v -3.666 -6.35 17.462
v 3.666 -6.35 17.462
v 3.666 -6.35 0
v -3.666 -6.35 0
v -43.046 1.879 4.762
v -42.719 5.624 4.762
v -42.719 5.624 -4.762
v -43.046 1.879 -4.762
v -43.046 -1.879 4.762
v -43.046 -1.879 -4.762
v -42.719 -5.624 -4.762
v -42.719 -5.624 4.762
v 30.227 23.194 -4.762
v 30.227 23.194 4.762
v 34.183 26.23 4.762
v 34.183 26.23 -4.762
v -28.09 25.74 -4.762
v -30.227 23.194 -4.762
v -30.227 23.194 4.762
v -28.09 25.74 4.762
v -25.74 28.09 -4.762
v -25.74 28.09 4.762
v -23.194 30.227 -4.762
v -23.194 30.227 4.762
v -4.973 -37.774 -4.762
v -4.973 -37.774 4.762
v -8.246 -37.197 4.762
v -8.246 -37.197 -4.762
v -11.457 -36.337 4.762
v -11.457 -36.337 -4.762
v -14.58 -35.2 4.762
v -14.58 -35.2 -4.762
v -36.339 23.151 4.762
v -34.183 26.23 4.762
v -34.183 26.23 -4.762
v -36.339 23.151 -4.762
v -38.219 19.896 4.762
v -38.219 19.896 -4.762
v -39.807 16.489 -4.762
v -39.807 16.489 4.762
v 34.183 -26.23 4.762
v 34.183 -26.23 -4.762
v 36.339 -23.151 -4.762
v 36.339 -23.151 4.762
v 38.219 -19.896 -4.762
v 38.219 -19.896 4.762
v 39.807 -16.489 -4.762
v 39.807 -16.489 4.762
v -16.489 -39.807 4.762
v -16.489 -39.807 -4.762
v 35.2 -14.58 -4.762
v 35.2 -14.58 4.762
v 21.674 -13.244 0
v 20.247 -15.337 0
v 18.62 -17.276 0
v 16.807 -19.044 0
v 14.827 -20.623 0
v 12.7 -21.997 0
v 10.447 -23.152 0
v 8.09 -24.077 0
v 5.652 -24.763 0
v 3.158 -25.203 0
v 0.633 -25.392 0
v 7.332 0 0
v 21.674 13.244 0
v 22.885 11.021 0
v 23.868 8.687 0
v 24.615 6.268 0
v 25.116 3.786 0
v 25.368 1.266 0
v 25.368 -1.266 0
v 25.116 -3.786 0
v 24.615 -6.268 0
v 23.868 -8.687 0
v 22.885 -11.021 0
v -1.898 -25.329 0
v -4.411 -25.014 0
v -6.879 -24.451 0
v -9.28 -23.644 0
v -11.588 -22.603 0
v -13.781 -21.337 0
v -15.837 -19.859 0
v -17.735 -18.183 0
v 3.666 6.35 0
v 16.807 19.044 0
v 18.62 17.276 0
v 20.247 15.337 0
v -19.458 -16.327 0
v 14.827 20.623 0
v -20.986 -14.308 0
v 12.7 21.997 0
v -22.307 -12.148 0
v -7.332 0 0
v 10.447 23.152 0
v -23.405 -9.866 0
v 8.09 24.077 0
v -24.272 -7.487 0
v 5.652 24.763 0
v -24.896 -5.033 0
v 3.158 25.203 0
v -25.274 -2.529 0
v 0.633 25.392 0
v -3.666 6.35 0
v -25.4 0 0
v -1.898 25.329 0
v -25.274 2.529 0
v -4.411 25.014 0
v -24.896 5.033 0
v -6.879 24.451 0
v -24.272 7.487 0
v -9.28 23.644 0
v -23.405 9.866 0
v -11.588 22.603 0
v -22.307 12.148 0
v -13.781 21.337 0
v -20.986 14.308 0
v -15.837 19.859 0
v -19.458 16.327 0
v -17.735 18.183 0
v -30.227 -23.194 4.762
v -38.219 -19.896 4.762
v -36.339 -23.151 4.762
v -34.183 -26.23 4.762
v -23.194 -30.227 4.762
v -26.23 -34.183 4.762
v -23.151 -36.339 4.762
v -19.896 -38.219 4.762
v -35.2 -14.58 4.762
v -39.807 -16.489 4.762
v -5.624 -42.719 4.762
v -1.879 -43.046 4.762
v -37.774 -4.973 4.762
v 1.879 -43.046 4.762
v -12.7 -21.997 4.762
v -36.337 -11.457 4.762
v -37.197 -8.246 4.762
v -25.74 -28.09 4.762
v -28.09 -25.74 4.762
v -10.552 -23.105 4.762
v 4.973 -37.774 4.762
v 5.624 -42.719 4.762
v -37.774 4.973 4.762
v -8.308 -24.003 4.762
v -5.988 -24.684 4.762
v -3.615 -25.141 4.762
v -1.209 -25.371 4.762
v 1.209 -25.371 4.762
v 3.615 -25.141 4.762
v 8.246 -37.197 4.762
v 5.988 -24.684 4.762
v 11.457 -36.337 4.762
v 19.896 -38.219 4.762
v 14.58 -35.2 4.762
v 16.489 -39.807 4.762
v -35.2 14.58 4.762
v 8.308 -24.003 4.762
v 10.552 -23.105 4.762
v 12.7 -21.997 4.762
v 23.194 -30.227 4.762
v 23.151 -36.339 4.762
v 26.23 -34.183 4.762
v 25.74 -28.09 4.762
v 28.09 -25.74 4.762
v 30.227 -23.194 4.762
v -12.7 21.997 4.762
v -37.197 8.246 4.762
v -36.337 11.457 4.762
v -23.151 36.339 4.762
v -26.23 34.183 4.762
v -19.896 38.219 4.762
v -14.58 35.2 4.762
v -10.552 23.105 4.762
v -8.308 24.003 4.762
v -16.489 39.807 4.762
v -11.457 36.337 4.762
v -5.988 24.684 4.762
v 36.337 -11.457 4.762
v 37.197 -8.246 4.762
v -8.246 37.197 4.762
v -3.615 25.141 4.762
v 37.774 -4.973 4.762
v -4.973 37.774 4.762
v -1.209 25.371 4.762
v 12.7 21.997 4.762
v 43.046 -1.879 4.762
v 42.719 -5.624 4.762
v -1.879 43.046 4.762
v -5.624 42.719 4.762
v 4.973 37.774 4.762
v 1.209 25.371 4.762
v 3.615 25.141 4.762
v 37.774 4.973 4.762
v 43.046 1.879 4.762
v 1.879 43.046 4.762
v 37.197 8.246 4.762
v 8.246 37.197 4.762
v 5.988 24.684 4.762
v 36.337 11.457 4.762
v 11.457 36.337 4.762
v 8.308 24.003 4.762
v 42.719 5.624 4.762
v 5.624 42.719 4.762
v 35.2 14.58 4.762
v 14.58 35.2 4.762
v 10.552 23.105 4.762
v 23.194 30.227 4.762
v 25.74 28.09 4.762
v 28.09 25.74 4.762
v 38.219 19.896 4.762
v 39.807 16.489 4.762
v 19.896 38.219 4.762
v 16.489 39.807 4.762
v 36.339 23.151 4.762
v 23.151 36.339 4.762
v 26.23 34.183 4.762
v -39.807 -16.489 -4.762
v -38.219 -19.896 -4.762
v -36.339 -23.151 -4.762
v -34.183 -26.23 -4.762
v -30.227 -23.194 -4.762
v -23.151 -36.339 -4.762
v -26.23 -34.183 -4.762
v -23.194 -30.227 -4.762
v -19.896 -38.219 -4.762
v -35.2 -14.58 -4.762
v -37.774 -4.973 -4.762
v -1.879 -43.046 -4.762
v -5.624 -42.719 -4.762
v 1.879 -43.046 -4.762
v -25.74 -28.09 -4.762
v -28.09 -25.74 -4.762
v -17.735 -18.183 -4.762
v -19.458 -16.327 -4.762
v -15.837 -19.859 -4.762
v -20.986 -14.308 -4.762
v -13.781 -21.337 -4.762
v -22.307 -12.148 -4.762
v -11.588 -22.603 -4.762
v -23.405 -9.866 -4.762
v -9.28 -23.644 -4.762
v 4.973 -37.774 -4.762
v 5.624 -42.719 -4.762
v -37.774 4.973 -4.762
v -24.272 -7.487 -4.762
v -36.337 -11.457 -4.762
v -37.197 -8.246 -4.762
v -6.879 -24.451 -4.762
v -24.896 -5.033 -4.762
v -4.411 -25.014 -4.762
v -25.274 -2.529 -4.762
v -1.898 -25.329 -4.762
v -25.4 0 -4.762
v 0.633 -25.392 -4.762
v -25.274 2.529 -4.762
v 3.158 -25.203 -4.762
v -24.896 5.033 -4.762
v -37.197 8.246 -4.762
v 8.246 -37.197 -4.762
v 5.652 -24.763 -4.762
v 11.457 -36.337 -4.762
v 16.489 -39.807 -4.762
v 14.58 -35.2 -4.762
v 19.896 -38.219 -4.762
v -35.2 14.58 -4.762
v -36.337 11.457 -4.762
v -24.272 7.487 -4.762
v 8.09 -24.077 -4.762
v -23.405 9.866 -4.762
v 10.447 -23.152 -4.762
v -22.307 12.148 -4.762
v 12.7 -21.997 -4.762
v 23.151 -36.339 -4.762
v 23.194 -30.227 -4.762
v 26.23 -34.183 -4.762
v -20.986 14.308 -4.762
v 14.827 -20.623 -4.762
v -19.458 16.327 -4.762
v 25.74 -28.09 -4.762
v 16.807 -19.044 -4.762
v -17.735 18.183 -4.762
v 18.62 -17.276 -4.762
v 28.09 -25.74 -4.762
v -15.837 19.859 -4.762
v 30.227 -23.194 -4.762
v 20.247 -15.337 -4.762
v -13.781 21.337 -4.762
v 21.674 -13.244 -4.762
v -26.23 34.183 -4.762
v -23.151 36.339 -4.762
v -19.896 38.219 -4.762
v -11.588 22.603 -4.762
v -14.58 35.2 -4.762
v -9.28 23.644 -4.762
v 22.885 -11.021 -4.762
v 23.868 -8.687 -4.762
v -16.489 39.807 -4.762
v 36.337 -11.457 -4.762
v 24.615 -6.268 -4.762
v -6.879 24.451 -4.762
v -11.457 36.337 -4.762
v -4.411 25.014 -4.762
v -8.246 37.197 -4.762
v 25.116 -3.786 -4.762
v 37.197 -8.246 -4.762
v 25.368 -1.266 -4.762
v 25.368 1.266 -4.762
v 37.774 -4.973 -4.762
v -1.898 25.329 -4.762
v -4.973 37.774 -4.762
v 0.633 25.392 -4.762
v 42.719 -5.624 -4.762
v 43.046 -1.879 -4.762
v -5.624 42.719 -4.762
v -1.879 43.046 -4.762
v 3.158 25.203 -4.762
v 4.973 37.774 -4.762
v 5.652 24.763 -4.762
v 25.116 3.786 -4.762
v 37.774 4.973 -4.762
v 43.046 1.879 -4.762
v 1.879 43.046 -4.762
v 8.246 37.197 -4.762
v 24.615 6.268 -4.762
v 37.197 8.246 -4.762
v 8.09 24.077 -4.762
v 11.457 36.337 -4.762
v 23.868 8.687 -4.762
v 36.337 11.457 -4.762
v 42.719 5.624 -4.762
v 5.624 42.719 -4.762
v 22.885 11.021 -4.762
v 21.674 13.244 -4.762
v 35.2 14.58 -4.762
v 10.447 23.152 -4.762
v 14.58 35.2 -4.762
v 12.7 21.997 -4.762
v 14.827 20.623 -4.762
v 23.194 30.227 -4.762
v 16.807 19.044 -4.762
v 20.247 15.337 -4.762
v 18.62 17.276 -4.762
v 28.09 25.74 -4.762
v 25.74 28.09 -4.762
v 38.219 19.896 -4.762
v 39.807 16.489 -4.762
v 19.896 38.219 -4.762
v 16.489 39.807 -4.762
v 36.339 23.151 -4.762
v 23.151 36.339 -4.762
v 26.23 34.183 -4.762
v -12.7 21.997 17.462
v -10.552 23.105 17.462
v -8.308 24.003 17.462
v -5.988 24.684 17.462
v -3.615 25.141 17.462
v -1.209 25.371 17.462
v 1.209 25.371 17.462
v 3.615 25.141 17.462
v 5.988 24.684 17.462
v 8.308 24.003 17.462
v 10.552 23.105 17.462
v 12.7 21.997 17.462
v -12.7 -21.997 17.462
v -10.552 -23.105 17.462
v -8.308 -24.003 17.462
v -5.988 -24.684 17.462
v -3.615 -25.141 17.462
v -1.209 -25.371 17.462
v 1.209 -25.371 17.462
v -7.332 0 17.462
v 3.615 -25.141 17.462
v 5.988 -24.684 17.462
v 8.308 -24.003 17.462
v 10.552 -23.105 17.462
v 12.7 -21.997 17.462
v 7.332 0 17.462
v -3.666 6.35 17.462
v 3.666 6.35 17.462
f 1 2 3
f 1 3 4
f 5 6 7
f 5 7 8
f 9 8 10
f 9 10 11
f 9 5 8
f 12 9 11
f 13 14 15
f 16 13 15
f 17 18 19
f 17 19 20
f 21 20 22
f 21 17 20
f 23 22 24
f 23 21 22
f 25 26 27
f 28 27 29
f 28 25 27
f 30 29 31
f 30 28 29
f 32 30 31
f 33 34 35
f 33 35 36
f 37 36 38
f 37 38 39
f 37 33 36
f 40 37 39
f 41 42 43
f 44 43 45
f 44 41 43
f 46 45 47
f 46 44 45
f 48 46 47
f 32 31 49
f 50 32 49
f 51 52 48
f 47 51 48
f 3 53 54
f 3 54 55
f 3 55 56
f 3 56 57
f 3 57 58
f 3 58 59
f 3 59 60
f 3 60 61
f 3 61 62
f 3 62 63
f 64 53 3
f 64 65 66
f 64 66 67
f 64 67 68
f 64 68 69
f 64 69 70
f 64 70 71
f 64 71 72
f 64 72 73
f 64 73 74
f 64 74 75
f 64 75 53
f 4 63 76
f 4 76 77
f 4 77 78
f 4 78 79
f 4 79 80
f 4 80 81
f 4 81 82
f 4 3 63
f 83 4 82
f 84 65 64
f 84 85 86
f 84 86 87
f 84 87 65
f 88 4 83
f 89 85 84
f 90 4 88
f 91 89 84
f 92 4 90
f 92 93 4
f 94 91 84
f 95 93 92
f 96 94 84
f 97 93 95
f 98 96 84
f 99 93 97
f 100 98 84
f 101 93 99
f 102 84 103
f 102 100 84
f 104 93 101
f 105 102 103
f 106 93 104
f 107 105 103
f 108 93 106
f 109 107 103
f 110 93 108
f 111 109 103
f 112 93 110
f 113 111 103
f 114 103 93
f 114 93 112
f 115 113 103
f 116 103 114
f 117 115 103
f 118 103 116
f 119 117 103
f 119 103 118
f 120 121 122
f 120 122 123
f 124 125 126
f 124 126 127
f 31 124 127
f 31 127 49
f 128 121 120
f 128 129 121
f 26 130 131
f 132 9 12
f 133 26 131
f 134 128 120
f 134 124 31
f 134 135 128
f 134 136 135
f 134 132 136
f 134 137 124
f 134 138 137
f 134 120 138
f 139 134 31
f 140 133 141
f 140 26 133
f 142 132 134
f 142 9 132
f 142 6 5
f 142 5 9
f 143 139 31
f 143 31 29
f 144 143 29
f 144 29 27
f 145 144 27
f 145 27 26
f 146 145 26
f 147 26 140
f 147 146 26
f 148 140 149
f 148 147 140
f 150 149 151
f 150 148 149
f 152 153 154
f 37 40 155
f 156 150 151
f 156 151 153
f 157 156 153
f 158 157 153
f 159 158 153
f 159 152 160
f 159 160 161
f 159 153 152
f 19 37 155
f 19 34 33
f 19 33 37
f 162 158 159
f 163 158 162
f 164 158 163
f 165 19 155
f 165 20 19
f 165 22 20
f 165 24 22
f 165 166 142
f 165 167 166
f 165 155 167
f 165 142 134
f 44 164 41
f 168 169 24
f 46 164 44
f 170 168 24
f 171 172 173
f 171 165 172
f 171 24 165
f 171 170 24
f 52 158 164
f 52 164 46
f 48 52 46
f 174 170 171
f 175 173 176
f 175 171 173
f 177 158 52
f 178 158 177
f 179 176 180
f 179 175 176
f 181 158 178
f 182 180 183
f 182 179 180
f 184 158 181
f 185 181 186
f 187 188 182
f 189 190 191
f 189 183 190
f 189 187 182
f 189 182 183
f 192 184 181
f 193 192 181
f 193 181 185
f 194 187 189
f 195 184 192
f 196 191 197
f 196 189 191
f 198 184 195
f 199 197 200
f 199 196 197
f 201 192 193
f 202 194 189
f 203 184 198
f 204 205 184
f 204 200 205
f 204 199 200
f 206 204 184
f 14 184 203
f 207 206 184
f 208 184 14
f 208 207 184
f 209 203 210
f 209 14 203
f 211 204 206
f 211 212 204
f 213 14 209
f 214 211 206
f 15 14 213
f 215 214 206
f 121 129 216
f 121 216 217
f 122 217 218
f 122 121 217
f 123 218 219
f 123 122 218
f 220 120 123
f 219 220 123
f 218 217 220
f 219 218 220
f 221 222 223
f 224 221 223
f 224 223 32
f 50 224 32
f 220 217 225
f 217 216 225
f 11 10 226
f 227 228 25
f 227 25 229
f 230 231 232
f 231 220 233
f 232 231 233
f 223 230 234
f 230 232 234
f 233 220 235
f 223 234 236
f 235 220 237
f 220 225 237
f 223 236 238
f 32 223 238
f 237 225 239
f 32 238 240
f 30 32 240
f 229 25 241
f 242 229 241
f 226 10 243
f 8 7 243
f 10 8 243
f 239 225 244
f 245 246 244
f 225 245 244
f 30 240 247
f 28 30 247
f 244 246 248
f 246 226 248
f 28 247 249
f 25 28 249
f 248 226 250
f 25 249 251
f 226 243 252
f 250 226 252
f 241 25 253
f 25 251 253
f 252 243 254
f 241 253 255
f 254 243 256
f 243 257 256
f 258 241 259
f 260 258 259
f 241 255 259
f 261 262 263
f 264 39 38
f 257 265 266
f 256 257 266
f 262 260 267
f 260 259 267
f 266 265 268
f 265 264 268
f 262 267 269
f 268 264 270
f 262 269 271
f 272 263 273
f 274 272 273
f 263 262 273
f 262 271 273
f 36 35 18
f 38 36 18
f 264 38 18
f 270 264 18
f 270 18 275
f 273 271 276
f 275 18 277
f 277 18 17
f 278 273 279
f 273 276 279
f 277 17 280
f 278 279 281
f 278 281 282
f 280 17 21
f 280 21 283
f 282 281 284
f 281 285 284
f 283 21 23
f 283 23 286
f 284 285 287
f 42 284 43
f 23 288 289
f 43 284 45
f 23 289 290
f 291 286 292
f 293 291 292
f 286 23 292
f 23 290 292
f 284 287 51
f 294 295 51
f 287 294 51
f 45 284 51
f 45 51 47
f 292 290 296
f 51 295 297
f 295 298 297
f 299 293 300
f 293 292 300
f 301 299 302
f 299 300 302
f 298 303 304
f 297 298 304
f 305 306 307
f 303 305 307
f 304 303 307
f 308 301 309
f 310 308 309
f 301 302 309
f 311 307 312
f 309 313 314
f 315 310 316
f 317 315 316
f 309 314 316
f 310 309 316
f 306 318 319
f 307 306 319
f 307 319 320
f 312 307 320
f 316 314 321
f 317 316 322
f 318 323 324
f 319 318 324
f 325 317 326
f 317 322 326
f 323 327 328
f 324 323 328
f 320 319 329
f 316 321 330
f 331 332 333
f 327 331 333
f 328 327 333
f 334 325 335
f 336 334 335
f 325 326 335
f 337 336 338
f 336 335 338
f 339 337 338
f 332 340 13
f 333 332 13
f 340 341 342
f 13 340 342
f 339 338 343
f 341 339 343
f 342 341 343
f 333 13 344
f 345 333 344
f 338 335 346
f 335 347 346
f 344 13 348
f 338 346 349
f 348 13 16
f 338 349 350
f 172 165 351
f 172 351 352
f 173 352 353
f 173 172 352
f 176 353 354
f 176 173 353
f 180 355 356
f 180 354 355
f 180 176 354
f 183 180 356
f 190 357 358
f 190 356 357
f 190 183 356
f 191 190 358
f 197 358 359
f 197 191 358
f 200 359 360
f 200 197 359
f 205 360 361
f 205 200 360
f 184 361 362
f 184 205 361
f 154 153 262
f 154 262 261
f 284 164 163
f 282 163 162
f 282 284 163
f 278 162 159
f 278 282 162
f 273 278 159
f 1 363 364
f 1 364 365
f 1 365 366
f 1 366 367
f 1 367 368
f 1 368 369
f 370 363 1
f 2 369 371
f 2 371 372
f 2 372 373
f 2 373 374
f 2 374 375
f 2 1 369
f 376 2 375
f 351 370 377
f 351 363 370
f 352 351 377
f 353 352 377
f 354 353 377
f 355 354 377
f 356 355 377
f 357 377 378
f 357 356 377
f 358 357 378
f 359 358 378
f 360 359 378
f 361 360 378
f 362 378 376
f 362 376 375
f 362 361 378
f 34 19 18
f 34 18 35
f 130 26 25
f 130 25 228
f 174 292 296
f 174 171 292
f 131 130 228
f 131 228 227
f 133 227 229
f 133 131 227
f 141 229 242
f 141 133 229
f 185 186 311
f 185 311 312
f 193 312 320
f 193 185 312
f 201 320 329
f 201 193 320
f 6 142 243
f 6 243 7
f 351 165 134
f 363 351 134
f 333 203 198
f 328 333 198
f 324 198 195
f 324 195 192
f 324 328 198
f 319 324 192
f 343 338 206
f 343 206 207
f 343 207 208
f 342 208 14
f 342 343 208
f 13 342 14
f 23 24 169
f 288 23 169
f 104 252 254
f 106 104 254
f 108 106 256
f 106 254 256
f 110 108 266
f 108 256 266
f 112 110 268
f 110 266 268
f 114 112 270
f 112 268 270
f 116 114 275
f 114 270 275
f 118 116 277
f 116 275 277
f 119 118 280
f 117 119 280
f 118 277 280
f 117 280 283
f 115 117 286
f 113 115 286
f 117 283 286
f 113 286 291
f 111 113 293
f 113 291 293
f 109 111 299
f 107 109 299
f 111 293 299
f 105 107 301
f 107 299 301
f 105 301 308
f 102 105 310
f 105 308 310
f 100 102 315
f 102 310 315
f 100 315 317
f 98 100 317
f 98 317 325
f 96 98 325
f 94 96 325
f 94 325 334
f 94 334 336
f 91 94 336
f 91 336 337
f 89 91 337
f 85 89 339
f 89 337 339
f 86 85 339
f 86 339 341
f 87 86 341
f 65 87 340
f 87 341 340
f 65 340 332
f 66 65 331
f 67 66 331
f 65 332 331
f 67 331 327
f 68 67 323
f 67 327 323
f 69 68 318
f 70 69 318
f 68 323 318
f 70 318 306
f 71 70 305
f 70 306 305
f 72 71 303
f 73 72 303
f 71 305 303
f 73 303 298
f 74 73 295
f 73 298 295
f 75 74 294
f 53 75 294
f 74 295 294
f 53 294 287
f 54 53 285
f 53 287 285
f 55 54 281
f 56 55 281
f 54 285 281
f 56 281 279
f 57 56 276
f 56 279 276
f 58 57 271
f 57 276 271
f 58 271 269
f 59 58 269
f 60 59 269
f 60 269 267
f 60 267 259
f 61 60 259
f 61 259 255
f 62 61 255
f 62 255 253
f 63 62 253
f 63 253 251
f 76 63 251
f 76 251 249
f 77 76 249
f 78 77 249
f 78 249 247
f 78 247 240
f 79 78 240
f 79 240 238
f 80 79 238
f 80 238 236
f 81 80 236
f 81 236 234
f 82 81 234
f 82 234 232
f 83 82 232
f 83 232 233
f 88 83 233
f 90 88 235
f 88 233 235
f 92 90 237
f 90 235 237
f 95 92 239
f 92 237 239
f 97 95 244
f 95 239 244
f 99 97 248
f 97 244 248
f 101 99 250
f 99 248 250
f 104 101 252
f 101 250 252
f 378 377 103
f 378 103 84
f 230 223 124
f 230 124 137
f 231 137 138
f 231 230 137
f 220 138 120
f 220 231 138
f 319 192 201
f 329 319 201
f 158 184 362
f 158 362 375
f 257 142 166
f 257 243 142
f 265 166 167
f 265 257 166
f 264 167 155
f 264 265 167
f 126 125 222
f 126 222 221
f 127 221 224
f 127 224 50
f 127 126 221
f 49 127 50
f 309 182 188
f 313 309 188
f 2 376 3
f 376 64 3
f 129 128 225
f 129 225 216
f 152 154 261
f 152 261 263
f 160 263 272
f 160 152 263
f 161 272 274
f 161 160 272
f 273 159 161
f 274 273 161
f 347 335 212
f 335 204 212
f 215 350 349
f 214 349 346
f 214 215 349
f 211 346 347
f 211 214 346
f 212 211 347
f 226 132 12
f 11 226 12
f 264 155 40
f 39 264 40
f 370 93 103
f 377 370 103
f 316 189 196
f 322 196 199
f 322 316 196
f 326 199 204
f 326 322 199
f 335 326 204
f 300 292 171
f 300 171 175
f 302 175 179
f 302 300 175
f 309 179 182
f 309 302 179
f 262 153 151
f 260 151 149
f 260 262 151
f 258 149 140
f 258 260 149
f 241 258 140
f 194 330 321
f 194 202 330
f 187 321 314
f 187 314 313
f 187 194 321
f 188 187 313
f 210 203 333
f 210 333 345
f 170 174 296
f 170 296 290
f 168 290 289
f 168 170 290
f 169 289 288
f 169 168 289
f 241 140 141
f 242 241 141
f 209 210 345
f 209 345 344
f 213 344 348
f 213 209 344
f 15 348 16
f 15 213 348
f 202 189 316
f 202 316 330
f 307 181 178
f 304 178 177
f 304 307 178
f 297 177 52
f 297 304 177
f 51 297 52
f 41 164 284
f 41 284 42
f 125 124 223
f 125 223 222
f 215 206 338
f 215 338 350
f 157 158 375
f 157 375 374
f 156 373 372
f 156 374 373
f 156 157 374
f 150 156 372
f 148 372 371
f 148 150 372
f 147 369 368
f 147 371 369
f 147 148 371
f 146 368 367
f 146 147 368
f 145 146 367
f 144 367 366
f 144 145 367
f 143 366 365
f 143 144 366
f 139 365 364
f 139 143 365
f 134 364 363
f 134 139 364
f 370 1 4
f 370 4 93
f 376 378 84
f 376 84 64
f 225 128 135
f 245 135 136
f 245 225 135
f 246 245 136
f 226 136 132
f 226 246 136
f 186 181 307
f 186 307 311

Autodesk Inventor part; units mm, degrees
ref_plane "YZ Plane" through (0, 0, 0) normal (1, 0, 0) x (0, 1, 0)
ref_plane "XZ Plane" through (0, 0, 0) normal (0, 1, 0) x (-1, 0, 0)
ref_plane "XY Plane" through (0, 0, 0) normal (0, 0, 1) x (1, 0, 0)
sketch "Sketch1" plane through (0, 0, 0) normal (0, 0, 1) x (1, 0, 0)
  circle A0 centre (0, 0) radius 38.1
  dimension "d0" = 76.2
extrude "Extrusion1" add sketch "Sketch1" along normal mid plane 9.525
sketch "Sketch8" plane through (0, 0, 4.7625) normal (0, 0, 1) x (1, 0, 0)
  arc A0 (5.624, 42.7187) -> (-5.624, 42.7187) centre (0, 0) ccw
  circle A1 centre (0, 0) radius 38.1 projected
  line L0 (4.973, 37.774) -> (5.624, 42.7187)
  line L1 (-4.973, 37.774) -> (-5.624, 42.7187)
  line L2 (0, 0) -> (0, 43.0873) construction
  arc A2 (4.973, 37.774) -> (-4.973, 37.774) centre (0, 0) ccw
  dimension "d40" = 4.9873
  dimension "d41" = 15
  dimension "d42" = 7.5
extrude "Extrusion9" add sketch "Sketch8" against normal blind 9.525 contours L0 A1 L1 A0
pattern_circular "Circular Pattern4" count 12 over 360 about axis through (0, 0, -10) along (0, 0, 1) of "Extrusion9"
sketch "Sketch10" plane through (0, 0, 4.7625) normal (0, 0, 1) x (1, 0, 0)
  line L0 (7.3323, 0) -> (3.6662, -6.35)
  line L1 (3.6662, -6.35) -> (-3.6662, -6.35)
  line L2 (-3.6662, -6.35) -> (-7.3323, 0)
  line L3 (-7.3323, 0) -> (-3.6662, 6.35)
  line L4 (-3.6662, 6.35) -> (3.6662, 6.35)
  line L5 (3.6662, 6.35) -> (7.3323, 0)
  point P0 (0, 0)
  point P1 (0, 0)
  dimension "d55" = 12.7
extrude "Extrusion11" cut sketch "Sketch10" against normal through all
sketch "Sketch11" plane through (0, 0, -4.7625) normal (0, 0, -1) x (-1, 0, 0)
  circle A0 centre (0, 0) radius 25.4
  dimension "d58" = 50.8
extrude "Extrusion12" cut sketch "Sketch11" against normal blind 4.7625
sketch "Sketch12" plane through (0, 0, 4.7625) normal (0, 0, 1) x (1, 0, 0)
  line L0 (7.3323, 0) -> (3.6662, -6.35)
  line L1 (3.6662, -6.35) -> (-3.6662, -6.35)
  line L2 (-3.6662, -6.35) -> (-7.3323, 0)
  line L3 (-7.3323, 0) -> (-3.6662, 6.35)
  line L4 (-3.6662, 6.35) -> (3.6662, 6.35)
  line L5 (3.6662, 6.35) -> (7.3323, 0)
  circle A0 centre (0, 0) radius 25.4 projected
  line L6 (-12.7, 21.997) -> (-12.7, -21.997)
  line L7 (12.7, 21.997) -> (12.7, -21.997)
  arc A1 (12.7, 21.997) -> (-12.7, 21.997) centre (0, 0) ccw
  arc A2 (-12.7, -21.997) -> (12.7, -21.997) centre (0, 0) ccw
  dimension "d61" = 12.7
  dimension "d65" = 25.4
extrude "Extrusion14" add sketch "Sketch12" along normal blind 12.7 contours L7 A0 L6
equation "\"d0\" = externalDiameter"
equation "\"d40\" = depthOfExternalSpline"
equation "\"d55\" = hexSize"
equation "\"internalDiameter\" = 50.8"
equation "\"externalDiameter\" = 76.2"
equation "\"pi\" = 3.141593"
equation "\"depthOfInternalSpline\" = 0.5 * widthOfInternalSpline"
equation "\"depthOfExternalSpline\" = 0.5 * widthOfExternalSpline"
equation "\"thickness\" = 9.525"
equation "\"hexSize\" = 12.7"
equation "\"widthOfInternalSpline\" = 6.649704"
equation "\"widthOfExternalSpline\" = 9.974557"
properties part number "gearLock" material "PC/ABS Plastic"
